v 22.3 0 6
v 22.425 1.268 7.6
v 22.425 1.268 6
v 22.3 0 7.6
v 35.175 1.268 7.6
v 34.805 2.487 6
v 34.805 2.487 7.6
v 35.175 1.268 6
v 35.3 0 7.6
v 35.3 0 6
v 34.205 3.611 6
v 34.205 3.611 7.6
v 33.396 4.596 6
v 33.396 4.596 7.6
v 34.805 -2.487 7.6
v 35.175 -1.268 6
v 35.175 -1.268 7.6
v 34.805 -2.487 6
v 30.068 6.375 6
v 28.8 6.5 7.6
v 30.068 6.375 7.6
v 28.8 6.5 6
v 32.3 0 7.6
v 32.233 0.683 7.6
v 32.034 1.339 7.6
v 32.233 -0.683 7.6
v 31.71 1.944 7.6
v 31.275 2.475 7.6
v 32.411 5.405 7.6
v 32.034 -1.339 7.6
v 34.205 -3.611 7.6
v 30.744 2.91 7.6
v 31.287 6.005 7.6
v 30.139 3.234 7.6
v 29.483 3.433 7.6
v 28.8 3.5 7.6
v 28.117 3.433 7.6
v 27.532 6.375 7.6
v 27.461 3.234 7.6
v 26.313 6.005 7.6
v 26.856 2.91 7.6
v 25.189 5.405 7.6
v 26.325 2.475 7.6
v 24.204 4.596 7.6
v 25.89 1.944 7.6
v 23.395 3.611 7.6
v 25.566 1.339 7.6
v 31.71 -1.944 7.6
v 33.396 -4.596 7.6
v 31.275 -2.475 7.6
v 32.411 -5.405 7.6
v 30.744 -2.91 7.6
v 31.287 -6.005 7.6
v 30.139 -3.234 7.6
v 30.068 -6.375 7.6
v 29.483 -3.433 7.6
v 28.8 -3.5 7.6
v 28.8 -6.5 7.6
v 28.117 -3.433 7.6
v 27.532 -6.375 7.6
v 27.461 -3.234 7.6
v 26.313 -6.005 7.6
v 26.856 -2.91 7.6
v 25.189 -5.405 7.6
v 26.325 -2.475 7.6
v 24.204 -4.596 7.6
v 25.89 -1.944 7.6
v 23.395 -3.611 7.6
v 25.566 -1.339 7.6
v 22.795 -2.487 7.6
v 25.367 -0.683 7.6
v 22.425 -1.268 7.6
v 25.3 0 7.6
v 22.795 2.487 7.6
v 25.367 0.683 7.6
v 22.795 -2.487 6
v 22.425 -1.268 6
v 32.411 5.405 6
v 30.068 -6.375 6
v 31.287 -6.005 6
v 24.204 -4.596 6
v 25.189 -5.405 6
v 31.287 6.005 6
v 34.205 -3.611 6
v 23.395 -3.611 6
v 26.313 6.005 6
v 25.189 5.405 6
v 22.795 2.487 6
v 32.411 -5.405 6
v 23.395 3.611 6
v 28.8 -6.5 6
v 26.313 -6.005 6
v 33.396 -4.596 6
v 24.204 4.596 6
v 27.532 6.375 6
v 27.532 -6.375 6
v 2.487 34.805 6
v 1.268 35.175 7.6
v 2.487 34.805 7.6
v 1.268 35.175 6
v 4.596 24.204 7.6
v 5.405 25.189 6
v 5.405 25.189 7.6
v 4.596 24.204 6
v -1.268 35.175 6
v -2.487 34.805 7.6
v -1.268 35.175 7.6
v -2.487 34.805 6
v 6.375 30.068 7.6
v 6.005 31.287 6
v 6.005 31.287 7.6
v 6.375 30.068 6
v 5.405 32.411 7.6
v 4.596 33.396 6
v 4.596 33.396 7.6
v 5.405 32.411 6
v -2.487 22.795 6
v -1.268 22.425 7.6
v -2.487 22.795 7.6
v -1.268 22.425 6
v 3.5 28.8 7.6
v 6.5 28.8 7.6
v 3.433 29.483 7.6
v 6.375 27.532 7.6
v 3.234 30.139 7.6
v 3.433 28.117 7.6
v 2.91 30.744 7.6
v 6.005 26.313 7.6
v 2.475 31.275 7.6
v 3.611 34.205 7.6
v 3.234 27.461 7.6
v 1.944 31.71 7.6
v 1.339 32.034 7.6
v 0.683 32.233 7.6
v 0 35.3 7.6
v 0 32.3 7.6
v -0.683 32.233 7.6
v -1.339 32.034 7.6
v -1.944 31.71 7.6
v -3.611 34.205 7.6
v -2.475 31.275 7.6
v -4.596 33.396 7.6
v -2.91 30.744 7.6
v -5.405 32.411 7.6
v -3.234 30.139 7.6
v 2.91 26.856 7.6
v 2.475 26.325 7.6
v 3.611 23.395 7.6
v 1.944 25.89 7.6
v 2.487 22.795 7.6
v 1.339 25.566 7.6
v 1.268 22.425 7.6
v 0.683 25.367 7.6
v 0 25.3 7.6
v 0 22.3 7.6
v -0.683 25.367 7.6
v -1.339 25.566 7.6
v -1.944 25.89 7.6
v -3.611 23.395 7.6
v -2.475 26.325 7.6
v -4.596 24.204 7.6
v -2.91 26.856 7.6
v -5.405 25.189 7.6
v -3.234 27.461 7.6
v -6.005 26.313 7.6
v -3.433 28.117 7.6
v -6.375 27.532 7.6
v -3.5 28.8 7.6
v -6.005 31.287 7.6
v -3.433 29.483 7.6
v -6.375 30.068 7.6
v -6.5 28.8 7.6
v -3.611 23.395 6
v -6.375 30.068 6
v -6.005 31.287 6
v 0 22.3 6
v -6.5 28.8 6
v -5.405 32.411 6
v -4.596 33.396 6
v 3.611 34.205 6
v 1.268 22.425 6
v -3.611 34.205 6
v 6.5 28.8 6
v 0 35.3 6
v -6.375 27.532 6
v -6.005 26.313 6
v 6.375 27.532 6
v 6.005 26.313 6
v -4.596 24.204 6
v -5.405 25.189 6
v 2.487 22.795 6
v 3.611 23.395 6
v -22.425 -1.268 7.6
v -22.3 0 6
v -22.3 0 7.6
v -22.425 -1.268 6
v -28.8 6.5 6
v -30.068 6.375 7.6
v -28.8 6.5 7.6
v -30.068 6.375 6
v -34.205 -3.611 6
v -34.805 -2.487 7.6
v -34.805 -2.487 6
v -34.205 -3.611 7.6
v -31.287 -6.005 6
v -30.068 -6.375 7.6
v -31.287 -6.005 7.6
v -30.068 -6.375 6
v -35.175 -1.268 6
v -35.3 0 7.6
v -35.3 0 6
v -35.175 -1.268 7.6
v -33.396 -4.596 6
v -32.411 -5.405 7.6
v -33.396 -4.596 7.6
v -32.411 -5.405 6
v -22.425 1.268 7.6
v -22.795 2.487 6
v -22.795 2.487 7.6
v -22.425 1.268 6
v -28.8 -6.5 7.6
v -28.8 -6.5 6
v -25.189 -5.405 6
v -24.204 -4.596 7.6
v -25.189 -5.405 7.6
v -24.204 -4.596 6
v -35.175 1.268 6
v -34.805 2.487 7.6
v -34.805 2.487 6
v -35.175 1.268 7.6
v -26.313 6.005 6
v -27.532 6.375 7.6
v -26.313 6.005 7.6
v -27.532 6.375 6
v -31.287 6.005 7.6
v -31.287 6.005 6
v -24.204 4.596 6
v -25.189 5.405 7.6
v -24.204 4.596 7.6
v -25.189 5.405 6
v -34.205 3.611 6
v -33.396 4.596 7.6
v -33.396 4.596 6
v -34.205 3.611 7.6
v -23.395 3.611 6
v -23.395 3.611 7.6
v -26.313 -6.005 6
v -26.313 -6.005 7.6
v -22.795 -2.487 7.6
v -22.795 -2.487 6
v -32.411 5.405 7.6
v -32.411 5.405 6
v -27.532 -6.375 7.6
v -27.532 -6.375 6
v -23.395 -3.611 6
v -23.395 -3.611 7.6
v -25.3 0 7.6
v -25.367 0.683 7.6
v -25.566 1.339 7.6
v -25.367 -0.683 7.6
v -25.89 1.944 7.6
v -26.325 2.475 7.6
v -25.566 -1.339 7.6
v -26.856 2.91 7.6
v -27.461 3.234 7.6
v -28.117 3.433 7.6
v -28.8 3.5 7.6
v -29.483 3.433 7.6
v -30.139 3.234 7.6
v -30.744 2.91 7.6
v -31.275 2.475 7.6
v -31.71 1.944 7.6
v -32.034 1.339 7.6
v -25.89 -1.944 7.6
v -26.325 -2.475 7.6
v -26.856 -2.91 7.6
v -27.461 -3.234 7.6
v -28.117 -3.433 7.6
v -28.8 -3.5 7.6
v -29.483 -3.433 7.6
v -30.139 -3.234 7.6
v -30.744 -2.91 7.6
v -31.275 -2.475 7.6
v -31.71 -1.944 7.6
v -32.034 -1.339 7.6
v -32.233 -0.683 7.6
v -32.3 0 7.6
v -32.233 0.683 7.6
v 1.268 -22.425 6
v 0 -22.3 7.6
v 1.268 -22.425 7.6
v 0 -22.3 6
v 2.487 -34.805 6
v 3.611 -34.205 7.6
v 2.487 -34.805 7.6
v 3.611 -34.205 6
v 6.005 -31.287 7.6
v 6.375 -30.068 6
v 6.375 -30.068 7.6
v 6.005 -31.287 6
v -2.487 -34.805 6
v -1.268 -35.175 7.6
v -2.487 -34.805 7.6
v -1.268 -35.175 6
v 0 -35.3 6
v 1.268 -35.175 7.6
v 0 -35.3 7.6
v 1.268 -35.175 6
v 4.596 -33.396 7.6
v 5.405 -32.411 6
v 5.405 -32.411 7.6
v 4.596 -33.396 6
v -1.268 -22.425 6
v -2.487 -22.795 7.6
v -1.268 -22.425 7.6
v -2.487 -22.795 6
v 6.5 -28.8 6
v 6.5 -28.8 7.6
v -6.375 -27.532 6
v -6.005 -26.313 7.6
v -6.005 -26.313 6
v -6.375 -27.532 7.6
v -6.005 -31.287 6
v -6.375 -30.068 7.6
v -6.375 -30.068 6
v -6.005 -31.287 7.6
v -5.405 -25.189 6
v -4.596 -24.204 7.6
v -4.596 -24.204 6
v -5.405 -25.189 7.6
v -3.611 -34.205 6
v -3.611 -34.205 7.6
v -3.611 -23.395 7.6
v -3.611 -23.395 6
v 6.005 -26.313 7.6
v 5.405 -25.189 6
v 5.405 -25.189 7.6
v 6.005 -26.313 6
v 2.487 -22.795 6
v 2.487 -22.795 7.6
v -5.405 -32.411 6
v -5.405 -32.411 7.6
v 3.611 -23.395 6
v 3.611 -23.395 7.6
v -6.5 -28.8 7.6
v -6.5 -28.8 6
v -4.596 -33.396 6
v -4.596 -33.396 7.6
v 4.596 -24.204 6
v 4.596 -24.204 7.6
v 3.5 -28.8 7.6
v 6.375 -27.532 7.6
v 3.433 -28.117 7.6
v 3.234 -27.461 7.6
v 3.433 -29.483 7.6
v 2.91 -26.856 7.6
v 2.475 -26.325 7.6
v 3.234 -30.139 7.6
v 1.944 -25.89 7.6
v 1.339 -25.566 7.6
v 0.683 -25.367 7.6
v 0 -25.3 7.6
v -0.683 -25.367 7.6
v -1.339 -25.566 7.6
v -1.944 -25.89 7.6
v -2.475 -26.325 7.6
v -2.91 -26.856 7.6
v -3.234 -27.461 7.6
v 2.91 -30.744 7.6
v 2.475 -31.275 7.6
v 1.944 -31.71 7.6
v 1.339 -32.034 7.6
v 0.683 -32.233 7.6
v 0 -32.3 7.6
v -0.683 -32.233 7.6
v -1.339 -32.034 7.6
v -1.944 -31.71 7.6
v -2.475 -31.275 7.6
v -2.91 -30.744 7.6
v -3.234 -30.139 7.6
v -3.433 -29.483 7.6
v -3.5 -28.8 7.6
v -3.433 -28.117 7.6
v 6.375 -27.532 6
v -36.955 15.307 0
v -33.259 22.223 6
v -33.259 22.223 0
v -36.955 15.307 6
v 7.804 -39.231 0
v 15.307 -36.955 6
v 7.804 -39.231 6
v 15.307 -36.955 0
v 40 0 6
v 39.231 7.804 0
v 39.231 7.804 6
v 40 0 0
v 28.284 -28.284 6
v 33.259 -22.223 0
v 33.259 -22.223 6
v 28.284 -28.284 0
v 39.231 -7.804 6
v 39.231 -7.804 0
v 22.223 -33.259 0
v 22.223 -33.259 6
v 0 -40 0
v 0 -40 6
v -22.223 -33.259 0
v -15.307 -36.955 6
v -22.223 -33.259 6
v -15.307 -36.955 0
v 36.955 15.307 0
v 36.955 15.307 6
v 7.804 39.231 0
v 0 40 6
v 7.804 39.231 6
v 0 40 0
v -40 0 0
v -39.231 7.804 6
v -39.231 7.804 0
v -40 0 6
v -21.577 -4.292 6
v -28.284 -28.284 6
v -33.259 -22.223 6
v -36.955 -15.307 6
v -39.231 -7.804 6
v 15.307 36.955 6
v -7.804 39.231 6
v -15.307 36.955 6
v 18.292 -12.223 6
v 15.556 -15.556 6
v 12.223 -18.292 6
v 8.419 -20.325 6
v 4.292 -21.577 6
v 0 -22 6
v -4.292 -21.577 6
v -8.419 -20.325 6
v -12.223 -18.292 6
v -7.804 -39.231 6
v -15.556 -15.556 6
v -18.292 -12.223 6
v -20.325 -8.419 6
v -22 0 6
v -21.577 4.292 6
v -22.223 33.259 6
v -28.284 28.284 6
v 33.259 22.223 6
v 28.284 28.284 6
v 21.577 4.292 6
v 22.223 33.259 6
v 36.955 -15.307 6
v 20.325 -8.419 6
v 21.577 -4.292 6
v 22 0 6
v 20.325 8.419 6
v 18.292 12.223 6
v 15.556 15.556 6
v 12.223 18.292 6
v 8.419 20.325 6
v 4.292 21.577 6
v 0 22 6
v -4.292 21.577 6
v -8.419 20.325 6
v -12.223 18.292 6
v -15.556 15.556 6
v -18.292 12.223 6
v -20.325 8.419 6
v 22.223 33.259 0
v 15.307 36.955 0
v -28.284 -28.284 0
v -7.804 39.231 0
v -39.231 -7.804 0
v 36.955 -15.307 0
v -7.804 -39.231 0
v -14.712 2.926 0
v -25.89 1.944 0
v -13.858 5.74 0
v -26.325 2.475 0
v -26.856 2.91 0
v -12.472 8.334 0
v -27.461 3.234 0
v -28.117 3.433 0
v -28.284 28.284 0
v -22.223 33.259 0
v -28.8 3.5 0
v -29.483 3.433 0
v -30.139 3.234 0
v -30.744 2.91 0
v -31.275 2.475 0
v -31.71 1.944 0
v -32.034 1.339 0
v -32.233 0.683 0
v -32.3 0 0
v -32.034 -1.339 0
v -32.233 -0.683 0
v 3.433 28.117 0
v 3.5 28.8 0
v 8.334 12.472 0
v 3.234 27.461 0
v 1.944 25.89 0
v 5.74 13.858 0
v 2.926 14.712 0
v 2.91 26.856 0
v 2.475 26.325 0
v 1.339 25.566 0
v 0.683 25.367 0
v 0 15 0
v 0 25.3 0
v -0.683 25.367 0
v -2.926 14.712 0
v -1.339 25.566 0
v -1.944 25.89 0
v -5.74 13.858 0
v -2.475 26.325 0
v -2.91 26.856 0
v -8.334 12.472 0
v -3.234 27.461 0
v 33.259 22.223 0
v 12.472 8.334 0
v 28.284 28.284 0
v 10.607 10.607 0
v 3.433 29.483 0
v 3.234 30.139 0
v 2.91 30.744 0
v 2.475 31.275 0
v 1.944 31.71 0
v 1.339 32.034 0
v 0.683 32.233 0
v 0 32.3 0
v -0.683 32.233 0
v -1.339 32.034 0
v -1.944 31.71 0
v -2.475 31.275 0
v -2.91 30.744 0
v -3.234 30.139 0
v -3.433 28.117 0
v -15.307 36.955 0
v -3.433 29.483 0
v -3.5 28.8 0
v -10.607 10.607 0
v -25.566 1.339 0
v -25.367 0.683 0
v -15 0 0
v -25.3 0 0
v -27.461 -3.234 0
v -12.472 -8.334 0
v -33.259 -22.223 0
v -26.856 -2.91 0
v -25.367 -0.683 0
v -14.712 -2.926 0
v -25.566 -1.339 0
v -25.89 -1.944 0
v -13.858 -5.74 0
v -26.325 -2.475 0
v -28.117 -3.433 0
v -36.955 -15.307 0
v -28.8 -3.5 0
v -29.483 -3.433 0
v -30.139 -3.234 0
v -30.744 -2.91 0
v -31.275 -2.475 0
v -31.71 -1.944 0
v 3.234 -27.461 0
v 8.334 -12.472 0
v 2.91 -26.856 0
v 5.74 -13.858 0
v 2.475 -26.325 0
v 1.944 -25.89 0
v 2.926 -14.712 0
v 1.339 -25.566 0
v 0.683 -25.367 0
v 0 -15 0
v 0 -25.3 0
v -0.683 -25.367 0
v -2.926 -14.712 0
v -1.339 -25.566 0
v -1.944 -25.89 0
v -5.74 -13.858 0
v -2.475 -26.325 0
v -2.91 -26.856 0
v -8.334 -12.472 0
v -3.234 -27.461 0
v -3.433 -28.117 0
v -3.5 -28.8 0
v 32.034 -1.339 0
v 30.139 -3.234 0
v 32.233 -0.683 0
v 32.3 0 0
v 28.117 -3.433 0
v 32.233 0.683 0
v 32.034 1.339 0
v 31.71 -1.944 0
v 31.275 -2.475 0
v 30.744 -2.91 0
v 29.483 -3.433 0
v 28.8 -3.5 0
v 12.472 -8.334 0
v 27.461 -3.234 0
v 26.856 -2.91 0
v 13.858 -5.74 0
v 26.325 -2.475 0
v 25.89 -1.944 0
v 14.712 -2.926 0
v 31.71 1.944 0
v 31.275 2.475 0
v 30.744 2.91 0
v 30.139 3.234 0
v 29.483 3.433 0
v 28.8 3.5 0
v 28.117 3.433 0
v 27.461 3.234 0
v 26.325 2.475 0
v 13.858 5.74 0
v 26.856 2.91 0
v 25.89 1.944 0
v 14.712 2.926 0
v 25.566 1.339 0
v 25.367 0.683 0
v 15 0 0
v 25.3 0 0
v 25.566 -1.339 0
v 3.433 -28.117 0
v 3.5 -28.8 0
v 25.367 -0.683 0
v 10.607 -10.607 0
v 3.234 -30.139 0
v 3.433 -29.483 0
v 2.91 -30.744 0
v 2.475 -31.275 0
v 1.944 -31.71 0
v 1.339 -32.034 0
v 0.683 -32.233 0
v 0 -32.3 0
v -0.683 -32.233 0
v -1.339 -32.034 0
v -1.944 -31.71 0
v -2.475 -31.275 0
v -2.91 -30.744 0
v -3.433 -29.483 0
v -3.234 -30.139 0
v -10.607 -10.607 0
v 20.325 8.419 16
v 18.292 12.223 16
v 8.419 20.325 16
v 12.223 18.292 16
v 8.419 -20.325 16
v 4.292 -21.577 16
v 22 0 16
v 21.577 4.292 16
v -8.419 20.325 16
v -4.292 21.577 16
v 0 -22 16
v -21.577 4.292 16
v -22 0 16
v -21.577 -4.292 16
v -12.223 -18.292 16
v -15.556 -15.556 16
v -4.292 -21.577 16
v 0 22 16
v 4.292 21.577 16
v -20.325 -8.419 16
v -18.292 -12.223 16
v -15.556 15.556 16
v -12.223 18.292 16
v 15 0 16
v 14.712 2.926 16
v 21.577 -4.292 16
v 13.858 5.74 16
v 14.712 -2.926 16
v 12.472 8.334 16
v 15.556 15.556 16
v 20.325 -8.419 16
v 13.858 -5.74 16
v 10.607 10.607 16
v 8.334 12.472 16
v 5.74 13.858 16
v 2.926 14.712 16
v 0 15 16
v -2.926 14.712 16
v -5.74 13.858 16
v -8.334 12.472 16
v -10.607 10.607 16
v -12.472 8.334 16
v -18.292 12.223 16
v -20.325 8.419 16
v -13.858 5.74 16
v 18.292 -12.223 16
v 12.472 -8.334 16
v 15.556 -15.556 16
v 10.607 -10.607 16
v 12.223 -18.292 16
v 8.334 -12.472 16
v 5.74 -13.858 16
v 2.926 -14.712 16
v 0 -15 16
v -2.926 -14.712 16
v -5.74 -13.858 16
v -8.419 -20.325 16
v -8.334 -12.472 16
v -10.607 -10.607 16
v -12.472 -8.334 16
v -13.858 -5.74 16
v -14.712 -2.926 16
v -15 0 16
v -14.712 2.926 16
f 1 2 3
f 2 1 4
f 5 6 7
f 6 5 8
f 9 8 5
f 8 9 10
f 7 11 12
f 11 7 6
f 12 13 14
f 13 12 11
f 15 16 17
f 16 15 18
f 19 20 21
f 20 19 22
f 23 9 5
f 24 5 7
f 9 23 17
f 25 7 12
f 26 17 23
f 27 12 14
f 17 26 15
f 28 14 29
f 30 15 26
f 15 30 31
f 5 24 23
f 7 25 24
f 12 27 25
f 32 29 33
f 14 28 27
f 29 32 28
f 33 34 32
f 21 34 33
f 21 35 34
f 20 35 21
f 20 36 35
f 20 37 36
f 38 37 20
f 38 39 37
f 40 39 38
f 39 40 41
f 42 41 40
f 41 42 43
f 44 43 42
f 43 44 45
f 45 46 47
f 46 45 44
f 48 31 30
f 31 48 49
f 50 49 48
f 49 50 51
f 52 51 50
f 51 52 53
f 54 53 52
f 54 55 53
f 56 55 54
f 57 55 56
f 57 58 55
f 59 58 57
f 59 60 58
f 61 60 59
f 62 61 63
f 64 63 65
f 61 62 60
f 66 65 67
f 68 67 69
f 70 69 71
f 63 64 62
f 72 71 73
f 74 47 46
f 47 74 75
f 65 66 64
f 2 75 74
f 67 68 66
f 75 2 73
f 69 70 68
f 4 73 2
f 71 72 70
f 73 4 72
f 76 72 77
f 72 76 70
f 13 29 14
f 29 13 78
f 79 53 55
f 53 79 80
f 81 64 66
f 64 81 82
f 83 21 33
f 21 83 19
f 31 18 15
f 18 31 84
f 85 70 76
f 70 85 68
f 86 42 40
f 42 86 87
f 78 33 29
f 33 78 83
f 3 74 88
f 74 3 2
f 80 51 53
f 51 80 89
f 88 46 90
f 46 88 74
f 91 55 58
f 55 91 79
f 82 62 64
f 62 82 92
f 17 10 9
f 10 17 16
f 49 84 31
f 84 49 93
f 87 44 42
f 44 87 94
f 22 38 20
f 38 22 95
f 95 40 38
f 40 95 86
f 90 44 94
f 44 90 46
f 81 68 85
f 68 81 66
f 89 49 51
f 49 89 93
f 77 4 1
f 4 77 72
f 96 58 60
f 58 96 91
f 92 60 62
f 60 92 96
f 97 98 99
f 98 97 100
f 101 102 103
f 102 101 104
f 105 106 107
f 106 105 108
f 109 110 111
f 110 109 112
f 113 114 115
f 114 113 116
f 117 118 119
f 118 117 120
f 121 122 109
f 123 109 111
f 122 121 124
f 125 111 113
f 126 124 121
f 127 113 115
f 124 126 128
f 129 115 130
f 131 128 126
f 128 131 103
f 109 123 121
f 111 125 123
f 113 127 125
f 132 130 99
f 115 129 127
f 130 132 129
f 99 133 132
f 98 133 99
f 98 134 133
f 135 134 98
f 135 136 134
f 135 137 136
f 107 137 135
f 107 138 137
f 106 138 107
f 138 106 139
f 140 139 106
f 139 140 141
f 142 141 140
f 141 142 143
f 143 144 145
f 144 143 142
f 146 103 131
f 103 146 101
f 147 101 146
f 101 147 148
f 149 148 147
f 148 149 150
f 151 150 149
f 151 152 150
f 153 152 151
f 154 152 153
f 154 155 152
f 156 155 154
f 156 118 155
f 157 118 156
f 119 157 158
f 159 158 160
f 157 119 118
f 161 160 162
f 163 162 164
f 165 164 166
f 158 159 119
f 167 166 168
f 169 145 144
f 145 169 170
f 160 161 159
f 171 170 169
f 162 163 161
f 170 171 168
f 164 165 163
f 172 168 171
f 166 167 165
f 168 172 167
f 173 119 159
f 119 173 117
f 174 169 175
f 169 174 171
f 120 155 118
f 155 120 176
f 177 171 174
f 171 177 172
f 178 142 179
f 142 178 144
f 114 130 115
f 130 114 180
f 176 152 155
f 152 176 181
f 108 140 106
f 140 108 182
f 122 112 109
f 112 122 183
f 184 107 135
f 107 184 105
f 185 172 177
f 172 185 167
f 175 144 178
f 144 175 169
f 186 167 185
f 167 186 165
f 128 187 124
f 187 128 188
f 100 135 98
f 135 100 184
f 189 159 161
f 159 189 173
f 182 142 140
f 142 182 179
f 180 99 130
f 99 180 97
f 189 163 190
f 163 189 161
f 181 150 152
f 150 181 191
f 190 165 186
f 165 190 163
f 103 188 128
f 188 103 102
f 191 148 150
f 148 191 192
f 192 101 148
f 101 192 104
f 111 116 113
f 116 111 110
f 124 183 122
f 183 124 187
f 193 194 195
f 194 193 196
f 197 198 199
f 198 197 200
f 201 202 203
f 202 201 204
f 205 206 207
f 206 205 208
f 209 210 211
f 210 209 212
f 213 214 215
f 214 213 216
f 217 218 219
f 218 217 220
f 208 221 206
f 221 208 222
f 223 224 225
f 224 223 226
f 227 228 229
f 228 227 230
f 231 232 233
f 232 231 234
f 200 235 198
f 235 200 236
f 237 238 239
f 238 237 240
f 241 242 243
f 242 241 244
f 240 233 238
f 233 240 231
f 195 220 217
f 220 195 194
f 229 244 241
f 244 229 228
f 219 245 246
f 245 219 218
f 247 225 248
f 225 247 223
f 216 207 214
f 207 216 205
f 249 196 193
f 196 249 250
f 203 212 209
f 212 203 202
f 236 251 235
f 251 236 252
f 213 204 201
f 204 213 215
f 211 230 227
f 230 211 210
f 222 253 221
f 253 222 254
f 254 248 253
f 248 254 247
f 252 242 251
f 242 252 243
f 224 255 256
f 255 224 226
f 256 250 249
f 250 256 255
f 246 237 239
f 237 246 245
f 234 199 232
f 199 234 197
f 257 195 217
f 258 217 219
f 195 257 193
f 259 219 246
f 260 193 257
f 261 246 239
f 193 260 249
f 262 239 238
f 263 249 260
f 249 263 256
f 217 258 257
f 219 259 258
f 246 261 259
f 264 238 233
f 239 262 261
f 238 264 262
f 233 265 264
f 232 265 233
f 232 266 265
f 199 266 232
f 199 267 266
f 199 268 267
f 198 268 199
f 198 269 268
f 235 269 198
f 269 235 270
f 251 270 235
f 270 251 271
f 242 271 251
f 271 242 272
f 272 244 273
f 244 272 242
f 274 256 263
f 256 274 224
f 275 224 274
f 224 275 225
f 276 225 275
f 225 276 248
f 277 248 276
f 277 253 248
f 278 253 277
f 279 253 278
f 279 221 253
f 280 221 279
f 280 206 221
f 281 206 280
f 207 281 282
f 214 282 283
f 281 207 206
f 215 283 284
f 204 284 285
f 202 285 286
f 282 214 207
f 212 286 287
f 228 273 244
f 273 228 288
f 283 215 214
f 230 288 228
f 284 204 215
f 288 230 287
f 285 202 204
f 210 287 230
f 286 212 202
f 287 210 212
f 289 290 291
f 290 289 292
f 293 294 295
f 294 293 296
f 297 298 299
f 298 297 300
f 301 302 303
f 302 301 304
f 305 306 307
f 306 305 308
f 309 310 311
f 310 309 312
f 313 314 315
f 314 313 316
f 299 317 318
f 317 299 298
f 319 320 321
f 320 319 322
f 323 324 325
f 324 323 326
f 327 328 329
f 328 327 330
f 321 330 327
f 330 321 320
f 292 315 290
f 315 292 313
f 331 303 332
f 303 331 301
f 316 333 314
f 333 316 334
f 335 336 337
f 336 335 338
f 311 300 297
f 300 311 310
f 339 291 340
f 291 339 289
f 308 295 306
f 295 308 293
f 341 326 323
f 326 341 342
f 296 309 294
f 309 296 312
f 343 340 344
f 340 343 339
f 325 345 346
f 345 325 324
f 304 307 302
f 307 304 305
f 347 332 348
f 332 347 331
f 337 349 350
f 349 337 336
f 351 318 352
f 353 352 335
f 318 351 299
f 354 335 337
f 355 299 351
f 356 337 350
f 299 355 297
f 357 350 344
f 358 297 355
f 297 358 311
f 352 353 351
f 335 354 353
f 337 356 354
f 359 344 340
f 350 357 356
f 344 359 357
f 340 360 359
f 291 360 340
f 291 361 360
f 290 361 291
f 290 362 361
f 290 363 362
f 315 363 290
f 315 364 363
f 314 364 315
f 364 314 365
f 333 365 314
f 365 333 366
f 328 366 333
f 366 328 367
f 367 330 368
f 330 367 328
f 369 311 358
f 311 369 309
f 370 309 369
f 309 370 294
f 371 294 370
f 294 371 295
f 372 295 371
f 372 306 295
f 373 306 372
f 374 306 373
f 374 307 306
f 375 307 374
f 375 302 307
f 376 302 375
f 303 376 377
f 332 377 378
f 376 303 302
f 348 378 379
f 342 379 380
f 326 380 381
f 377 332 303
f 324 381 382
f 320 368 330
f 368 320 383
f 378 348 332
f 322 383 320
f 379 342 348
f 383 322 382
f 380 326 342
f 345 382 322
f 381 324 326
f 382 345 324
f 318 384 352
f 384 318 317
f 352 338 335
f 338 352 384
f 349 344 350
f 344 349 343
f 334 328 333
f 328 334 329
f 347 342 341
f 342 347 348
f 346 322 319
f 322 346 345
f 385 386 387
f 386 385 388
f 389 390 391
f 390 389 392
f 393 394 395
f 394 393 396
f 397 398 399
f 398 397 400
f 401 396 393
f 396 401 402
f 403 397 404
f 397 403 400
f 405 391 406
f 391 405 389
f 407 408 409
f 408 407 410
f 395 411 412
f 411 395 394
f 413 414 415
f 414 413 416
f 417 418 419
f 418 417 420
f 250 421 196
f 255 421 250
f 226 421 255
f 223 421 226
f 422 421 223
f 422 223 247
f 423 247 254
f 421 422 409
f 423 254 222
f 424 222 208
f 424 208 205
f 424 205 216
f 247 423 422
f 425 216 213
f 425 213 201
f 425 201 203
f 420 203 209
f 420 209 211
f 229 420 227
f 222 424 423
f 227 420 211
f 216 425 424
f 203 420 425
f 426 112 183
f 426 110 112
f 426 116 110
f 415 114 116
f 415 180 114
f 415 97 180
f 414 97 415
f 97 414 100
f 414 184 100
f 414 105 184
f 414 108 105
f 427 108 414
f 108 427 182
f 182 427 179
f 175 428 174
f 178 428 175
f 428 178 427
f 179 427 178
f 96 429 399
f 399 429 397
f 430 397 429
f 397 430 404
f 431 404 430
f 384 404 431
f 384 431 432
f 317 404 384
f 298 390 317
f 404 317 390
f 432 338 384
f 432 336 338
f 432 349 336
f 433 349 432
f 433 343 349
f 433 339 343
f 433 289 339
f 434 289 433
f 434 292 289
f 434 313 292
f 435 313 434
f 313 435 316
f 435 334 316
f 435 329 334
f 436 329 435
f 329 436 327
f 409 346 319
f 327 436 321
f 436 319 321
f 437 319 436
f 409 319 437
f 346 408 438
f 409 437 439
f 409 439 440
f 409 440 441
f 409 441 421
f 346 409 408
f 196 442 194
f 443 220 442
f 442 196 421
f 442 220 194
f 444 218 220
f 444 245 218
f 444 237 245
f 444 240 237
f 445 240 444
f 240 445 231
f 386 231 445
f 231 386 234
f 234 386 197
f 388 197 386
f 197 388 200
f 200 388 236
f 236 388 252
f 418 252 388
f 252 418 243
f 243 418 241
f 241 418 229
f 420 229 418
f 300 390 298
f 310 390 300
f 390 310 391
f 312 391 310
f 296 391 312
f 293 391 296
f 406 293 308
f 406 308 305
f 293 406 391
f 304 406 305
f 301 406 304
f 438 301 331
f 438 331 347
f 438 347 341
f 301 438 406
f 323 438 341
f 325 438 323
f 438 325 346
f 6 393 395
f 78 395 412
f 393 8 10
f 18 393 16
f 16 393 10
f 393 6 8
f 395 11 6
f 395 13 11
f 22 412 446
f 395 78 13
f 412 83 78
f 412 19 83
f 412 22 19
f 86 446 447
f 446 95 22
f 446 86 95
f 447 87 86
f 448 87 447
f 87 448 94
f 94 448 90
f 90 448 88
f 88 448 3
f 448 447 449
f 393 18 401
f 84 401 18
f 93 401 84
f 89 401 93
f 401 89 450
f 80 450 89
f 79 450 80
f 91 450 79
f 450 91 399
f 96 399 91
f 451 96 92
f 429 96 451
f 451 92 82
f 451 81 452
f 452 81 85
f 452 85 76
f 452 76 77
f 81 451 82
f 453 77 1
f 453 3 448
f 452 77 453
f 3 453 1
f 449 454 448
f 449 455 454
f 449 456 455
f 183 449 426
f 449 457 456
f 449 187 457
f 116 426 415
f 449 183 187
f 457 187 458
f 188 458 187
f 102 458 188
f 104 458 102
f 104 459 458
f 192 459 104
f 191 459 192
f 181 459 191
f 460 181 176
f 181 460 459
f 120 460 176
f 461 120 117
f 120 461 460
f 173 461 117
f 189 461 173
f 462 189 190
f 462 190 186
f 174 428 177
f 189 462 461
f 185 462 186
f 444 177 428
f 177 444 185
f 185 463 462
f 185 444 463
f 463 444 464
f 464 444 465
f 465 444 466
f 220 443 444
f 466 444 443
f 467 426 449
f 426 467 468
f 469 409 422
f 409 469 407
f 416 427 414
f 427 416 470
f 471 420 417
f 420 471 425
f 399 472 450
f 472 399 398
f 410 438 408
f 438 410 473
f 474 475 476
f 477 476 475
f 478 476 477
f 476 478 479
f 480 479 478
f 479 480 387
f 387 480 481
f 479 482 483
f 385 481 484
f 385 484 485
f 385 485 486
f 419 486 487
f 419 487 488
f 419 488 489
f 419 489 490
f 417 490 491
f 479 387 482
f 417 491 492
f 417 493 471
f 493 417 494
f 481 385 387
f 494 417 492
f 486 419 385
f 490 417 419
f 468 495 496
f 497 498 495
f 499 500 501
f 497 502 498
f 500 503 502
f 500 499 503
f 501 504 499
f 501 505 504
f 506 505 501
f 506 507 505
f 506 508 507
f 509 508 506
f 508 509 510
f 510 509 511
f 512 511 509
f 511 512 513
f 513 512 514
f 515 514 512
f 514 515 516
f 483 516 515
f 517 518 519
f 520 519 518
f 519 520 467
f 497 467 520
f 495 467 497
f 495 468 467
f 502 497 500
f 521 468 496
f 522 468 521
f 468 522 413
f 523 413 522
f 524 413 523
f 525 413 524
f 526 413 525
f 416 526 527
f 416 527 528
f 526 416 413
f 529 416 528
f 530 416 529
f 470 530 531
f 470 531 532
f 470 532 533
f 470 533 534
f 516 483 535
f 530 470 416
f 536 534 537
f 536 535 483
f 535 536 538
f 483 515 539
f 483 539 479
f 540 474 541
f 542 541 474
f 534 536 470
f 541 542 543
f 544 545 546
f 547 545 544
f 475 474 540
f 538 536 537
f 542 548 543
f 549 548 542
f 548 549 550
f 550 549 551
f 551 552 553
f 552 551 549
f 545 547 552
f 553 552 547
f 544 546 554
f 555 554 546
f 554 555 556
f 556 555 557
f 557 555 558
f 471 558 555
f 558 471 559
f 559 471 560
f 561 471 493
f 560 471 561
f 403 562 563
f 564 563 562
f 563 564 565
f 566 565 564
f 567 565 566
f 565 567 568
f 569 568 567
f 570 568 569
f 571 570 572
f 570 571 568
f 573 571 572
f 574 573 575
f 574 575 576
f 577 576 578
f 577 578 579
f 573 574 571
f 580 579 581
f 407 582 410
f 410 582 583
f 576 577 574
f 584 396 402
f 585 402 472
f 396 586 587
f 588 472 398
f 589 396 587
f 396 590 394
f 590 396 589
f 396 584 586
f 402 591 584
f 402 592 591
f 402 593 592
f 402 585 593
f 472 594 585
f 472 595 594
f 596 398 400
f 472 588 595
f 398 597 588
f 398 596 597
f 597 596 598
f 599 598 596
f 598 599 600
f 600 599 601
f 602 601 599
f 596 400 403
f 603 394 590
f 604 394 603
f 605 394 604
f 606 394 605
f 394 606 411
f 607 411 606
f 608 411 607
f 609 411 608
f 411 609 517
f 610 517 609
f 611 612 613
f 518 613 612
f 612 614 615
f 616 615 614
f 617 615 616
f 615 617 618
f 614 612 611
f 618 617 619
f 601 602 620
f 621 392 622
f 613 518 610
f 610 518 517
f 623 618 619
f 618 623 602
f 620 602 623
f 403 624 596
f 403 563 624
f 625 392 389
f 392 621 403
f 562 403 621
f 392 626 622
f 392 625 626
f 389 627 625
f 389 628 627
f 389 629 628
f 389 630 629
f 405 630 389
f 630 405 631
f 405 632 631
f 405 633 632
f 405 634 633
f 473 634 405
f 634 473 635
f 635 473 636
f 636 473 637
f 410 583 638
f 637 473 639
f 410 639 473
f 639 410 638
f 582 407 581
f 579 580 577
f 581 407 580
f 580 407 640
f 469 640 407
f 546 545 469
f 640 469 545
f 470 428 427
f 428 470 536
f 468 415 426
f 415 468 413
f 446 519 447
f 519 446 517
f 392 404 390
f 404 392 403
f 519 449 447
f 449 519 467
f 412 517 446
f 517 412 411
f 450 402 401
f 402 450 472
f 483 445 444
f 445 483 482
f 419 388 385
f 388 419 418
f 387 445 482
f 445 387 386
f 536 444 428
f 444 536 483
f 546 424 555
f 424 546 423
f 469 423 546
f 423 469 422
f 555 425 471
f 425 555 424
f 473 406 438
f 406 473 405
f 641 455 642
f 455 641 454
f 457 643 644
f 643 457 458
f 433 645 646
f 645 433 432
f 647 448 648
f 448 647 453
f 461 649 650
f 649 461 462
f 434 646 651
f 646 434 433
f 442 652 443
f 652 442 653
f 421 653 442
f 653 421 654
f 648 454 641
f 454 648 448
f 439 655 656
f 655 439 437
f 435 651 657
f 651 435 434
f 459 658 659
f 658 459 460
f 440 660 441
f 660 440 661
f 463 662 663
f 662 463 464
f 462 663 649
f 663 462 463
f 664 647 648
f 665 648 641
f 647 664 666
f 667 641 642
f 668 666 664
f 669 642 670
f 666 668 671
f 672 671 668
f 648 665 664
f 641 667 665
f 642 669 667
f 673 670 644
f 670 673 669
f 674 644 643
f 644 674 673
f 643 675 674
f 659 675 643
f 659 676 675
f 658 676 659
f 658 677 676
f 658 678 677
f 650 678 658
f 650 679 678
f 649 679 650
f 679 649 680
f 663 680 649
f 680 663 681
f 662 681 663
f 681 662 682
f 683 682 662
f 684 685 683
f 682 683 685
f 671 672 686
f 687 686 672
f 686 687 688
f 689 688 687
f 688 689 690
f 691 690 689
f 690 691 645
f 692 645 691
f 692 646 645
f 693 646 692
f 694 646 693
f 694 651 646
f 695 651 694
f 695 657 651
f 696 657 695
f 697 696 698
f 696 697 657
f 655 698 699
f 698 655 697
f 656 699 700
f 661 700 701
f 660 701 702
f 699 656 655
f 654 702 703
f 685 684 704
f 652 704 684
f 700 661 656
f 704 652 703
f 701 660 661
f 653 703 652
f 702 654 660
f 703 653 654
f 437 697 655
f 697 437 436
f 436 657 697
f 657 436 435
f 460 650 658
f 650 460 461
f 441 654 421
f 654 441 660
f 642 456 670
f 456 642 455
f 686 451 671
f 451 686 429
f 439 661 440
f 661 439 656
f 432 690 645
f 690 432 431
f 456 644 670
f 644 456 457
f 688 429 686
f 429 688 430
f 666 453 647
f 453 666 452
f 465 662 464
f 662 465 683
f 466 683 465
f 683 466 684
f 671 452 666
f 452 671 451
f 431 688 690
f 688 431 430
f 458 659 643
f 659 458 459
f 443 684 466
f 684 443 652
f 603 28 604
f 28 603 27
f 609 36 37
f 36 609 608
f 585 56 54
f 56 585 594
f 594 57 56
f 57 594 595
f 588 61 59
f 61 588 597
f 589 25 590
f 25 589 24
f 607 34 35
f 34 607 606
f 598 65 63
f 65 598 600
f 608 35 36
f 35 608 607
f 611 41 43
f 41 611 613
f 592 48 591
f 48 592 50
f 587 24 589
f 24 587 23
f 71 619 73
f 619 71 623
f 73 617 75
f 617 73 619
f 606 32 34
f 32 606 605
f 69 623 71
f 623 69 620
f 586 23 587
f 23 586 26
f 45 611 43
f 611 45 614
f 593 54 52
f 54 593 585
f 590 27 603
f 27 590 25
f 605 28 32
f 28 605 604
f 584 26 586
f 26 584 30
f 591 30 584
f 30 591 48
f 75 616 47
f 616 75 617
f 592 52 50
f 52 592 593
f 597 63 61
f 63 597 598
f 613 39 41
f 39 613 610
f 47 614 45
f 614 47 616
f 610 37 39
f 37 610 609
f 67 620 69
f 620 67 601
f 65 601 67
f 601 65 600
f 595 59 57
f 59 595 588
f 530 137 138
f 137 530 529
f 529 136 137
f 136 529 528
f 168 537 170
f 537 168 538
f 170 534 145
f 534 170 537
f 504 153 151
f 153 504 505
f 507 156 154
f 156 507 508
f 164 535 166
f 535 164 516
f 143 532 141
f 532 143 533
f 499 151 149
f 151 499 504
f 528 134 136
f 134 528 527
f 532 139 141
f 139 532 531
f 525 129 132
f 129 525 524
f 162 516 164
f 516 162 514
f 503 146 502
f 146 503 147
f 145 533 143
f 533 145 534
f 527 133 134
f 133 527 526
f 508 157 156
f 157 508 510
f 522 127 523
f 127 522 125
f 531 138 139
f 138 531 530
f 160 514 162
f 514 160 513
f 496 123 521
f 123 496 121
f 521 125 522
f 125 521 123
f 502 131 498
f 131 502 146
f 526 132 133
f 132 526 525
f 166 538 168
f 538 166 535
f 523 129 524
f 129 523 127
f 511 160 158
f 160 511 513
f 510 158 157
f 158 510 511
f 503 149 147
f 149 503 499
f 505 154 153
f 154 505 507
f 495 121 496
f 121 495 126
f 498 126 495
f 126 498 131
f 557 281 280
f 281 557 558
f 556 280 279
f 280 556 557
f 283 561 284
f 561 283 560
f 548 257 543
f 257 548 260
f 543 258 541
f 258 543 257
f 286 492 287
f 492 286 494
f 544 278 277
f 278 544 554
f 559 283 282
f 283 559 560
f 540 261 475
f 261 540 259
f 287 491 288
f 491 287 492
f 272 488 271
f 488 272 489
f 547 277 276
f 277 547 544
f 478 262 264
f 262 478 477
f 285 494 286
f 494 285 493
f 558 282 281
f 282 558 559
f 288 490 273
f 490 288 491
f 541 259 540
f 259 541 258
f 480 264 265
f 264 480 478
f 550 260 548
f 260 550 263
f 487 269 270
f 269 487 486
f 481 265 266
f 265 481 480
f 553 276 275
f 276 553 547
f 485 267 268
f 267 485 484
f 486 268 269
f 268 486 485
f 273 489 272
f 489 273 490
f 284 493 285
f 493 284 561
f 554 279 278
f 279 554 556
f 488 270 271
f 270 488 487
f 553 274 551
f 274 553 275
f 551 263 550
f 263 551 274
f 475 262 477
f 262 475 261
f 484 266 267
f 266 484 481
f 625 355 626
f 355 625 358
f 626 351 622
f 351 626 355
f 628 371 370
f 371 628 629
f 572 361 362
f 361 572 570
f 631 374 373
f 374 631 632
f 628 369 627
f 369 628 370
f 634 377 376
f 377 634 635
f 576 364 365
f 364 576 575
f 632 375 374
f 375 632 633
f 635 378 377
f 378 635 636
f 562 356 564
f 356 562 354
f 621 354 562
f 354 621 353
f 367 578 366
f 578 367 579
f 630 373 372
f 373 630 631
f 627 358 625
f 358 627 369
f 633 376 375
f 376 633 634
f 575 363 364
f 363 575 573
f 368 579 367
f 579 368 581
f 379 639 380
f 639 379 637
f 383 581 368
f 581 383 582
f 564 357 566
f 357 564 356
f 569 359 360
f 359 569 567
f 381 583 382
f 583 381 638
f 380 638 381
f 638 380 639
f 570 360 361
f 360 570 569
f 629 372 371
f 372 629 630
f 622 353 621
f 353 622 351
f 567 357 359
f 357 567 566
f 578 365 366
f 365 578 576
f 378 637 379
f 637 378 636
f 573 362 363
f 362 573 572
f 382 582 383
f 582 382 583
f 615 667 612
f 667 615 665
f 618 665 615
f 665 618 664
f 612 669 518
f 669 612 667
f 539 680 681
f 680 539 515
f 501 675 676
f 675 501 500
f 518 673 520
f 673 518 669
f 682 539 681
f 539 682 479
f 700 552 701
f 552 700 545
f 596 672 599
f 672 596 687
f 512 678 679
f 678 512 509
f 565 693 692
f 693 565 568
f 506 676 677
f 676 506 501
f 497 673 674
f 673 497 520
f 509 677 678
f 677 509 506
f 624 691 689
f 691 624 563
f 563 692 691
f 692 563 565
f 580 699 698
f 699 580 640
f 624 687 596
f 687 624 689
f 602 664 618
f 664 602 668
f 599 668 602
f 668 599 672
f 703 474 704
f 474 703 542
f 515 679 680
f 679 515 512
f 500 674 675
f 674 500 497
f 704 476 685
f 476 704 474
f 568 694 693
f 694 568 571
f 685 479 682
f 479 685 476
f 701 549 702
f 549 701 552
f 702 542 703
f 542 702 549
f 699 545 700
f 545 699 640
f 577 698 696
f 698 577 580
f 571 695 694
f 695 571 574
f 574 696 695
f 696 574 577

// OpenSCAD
$fn = 32;

// ----------------------------------------------------------------------
// Bolt-circle flange: 80 mm outside, 4 bolt holes, bore 30 mm
// ----------------------------------------------------------------------

// --- parameters (mm) ---
flange_d = 80;            // flange outside diameter
flange_t = 6;             // flange thickness
bolts = 4;                // number of bolt holes
bolt_d = 7;               // bolt clearance
bolt_r = 28.8;            // bolt circle radius
bore_d = 30;              // centre bore
hub_d = 44;               // raised hub diameter
hub_h = 10;               // raised hub height
spot_d = 13;              // spot faced bosses
spot_h = 1.6;             // spot face height

module body() {
  cylinder(h = flange_t, d = flange_d);
  /* raised hub, sunk 1 mm into the flange */
  translate([0, 0, flange_t - 1]) cylinder(h = hub_h + 1, d = hub_d);
  /* spot faced pads under the bolt heads */
  for (i = [0 : bolts - 1]) rotate([0, 0, i * 360 / bolts]) translate([bolt_r, 0, flange_t - 1]) cylinder(h = spot_h + 1, d = spot_d);
}

difference() {
  body();
  /* bolt circle */
  for (i = [0 : bolts - 1]) rotate([0, 0, i * 360 / bolts]) translate([bolt_r, 0, -1]) cylinder(h = flange_t + hub_h + 3, d = bolt_d);
  translate([0, 0, -1]) cylinder(h = flange_t + hub_h + 3, d = bore_d);
}
